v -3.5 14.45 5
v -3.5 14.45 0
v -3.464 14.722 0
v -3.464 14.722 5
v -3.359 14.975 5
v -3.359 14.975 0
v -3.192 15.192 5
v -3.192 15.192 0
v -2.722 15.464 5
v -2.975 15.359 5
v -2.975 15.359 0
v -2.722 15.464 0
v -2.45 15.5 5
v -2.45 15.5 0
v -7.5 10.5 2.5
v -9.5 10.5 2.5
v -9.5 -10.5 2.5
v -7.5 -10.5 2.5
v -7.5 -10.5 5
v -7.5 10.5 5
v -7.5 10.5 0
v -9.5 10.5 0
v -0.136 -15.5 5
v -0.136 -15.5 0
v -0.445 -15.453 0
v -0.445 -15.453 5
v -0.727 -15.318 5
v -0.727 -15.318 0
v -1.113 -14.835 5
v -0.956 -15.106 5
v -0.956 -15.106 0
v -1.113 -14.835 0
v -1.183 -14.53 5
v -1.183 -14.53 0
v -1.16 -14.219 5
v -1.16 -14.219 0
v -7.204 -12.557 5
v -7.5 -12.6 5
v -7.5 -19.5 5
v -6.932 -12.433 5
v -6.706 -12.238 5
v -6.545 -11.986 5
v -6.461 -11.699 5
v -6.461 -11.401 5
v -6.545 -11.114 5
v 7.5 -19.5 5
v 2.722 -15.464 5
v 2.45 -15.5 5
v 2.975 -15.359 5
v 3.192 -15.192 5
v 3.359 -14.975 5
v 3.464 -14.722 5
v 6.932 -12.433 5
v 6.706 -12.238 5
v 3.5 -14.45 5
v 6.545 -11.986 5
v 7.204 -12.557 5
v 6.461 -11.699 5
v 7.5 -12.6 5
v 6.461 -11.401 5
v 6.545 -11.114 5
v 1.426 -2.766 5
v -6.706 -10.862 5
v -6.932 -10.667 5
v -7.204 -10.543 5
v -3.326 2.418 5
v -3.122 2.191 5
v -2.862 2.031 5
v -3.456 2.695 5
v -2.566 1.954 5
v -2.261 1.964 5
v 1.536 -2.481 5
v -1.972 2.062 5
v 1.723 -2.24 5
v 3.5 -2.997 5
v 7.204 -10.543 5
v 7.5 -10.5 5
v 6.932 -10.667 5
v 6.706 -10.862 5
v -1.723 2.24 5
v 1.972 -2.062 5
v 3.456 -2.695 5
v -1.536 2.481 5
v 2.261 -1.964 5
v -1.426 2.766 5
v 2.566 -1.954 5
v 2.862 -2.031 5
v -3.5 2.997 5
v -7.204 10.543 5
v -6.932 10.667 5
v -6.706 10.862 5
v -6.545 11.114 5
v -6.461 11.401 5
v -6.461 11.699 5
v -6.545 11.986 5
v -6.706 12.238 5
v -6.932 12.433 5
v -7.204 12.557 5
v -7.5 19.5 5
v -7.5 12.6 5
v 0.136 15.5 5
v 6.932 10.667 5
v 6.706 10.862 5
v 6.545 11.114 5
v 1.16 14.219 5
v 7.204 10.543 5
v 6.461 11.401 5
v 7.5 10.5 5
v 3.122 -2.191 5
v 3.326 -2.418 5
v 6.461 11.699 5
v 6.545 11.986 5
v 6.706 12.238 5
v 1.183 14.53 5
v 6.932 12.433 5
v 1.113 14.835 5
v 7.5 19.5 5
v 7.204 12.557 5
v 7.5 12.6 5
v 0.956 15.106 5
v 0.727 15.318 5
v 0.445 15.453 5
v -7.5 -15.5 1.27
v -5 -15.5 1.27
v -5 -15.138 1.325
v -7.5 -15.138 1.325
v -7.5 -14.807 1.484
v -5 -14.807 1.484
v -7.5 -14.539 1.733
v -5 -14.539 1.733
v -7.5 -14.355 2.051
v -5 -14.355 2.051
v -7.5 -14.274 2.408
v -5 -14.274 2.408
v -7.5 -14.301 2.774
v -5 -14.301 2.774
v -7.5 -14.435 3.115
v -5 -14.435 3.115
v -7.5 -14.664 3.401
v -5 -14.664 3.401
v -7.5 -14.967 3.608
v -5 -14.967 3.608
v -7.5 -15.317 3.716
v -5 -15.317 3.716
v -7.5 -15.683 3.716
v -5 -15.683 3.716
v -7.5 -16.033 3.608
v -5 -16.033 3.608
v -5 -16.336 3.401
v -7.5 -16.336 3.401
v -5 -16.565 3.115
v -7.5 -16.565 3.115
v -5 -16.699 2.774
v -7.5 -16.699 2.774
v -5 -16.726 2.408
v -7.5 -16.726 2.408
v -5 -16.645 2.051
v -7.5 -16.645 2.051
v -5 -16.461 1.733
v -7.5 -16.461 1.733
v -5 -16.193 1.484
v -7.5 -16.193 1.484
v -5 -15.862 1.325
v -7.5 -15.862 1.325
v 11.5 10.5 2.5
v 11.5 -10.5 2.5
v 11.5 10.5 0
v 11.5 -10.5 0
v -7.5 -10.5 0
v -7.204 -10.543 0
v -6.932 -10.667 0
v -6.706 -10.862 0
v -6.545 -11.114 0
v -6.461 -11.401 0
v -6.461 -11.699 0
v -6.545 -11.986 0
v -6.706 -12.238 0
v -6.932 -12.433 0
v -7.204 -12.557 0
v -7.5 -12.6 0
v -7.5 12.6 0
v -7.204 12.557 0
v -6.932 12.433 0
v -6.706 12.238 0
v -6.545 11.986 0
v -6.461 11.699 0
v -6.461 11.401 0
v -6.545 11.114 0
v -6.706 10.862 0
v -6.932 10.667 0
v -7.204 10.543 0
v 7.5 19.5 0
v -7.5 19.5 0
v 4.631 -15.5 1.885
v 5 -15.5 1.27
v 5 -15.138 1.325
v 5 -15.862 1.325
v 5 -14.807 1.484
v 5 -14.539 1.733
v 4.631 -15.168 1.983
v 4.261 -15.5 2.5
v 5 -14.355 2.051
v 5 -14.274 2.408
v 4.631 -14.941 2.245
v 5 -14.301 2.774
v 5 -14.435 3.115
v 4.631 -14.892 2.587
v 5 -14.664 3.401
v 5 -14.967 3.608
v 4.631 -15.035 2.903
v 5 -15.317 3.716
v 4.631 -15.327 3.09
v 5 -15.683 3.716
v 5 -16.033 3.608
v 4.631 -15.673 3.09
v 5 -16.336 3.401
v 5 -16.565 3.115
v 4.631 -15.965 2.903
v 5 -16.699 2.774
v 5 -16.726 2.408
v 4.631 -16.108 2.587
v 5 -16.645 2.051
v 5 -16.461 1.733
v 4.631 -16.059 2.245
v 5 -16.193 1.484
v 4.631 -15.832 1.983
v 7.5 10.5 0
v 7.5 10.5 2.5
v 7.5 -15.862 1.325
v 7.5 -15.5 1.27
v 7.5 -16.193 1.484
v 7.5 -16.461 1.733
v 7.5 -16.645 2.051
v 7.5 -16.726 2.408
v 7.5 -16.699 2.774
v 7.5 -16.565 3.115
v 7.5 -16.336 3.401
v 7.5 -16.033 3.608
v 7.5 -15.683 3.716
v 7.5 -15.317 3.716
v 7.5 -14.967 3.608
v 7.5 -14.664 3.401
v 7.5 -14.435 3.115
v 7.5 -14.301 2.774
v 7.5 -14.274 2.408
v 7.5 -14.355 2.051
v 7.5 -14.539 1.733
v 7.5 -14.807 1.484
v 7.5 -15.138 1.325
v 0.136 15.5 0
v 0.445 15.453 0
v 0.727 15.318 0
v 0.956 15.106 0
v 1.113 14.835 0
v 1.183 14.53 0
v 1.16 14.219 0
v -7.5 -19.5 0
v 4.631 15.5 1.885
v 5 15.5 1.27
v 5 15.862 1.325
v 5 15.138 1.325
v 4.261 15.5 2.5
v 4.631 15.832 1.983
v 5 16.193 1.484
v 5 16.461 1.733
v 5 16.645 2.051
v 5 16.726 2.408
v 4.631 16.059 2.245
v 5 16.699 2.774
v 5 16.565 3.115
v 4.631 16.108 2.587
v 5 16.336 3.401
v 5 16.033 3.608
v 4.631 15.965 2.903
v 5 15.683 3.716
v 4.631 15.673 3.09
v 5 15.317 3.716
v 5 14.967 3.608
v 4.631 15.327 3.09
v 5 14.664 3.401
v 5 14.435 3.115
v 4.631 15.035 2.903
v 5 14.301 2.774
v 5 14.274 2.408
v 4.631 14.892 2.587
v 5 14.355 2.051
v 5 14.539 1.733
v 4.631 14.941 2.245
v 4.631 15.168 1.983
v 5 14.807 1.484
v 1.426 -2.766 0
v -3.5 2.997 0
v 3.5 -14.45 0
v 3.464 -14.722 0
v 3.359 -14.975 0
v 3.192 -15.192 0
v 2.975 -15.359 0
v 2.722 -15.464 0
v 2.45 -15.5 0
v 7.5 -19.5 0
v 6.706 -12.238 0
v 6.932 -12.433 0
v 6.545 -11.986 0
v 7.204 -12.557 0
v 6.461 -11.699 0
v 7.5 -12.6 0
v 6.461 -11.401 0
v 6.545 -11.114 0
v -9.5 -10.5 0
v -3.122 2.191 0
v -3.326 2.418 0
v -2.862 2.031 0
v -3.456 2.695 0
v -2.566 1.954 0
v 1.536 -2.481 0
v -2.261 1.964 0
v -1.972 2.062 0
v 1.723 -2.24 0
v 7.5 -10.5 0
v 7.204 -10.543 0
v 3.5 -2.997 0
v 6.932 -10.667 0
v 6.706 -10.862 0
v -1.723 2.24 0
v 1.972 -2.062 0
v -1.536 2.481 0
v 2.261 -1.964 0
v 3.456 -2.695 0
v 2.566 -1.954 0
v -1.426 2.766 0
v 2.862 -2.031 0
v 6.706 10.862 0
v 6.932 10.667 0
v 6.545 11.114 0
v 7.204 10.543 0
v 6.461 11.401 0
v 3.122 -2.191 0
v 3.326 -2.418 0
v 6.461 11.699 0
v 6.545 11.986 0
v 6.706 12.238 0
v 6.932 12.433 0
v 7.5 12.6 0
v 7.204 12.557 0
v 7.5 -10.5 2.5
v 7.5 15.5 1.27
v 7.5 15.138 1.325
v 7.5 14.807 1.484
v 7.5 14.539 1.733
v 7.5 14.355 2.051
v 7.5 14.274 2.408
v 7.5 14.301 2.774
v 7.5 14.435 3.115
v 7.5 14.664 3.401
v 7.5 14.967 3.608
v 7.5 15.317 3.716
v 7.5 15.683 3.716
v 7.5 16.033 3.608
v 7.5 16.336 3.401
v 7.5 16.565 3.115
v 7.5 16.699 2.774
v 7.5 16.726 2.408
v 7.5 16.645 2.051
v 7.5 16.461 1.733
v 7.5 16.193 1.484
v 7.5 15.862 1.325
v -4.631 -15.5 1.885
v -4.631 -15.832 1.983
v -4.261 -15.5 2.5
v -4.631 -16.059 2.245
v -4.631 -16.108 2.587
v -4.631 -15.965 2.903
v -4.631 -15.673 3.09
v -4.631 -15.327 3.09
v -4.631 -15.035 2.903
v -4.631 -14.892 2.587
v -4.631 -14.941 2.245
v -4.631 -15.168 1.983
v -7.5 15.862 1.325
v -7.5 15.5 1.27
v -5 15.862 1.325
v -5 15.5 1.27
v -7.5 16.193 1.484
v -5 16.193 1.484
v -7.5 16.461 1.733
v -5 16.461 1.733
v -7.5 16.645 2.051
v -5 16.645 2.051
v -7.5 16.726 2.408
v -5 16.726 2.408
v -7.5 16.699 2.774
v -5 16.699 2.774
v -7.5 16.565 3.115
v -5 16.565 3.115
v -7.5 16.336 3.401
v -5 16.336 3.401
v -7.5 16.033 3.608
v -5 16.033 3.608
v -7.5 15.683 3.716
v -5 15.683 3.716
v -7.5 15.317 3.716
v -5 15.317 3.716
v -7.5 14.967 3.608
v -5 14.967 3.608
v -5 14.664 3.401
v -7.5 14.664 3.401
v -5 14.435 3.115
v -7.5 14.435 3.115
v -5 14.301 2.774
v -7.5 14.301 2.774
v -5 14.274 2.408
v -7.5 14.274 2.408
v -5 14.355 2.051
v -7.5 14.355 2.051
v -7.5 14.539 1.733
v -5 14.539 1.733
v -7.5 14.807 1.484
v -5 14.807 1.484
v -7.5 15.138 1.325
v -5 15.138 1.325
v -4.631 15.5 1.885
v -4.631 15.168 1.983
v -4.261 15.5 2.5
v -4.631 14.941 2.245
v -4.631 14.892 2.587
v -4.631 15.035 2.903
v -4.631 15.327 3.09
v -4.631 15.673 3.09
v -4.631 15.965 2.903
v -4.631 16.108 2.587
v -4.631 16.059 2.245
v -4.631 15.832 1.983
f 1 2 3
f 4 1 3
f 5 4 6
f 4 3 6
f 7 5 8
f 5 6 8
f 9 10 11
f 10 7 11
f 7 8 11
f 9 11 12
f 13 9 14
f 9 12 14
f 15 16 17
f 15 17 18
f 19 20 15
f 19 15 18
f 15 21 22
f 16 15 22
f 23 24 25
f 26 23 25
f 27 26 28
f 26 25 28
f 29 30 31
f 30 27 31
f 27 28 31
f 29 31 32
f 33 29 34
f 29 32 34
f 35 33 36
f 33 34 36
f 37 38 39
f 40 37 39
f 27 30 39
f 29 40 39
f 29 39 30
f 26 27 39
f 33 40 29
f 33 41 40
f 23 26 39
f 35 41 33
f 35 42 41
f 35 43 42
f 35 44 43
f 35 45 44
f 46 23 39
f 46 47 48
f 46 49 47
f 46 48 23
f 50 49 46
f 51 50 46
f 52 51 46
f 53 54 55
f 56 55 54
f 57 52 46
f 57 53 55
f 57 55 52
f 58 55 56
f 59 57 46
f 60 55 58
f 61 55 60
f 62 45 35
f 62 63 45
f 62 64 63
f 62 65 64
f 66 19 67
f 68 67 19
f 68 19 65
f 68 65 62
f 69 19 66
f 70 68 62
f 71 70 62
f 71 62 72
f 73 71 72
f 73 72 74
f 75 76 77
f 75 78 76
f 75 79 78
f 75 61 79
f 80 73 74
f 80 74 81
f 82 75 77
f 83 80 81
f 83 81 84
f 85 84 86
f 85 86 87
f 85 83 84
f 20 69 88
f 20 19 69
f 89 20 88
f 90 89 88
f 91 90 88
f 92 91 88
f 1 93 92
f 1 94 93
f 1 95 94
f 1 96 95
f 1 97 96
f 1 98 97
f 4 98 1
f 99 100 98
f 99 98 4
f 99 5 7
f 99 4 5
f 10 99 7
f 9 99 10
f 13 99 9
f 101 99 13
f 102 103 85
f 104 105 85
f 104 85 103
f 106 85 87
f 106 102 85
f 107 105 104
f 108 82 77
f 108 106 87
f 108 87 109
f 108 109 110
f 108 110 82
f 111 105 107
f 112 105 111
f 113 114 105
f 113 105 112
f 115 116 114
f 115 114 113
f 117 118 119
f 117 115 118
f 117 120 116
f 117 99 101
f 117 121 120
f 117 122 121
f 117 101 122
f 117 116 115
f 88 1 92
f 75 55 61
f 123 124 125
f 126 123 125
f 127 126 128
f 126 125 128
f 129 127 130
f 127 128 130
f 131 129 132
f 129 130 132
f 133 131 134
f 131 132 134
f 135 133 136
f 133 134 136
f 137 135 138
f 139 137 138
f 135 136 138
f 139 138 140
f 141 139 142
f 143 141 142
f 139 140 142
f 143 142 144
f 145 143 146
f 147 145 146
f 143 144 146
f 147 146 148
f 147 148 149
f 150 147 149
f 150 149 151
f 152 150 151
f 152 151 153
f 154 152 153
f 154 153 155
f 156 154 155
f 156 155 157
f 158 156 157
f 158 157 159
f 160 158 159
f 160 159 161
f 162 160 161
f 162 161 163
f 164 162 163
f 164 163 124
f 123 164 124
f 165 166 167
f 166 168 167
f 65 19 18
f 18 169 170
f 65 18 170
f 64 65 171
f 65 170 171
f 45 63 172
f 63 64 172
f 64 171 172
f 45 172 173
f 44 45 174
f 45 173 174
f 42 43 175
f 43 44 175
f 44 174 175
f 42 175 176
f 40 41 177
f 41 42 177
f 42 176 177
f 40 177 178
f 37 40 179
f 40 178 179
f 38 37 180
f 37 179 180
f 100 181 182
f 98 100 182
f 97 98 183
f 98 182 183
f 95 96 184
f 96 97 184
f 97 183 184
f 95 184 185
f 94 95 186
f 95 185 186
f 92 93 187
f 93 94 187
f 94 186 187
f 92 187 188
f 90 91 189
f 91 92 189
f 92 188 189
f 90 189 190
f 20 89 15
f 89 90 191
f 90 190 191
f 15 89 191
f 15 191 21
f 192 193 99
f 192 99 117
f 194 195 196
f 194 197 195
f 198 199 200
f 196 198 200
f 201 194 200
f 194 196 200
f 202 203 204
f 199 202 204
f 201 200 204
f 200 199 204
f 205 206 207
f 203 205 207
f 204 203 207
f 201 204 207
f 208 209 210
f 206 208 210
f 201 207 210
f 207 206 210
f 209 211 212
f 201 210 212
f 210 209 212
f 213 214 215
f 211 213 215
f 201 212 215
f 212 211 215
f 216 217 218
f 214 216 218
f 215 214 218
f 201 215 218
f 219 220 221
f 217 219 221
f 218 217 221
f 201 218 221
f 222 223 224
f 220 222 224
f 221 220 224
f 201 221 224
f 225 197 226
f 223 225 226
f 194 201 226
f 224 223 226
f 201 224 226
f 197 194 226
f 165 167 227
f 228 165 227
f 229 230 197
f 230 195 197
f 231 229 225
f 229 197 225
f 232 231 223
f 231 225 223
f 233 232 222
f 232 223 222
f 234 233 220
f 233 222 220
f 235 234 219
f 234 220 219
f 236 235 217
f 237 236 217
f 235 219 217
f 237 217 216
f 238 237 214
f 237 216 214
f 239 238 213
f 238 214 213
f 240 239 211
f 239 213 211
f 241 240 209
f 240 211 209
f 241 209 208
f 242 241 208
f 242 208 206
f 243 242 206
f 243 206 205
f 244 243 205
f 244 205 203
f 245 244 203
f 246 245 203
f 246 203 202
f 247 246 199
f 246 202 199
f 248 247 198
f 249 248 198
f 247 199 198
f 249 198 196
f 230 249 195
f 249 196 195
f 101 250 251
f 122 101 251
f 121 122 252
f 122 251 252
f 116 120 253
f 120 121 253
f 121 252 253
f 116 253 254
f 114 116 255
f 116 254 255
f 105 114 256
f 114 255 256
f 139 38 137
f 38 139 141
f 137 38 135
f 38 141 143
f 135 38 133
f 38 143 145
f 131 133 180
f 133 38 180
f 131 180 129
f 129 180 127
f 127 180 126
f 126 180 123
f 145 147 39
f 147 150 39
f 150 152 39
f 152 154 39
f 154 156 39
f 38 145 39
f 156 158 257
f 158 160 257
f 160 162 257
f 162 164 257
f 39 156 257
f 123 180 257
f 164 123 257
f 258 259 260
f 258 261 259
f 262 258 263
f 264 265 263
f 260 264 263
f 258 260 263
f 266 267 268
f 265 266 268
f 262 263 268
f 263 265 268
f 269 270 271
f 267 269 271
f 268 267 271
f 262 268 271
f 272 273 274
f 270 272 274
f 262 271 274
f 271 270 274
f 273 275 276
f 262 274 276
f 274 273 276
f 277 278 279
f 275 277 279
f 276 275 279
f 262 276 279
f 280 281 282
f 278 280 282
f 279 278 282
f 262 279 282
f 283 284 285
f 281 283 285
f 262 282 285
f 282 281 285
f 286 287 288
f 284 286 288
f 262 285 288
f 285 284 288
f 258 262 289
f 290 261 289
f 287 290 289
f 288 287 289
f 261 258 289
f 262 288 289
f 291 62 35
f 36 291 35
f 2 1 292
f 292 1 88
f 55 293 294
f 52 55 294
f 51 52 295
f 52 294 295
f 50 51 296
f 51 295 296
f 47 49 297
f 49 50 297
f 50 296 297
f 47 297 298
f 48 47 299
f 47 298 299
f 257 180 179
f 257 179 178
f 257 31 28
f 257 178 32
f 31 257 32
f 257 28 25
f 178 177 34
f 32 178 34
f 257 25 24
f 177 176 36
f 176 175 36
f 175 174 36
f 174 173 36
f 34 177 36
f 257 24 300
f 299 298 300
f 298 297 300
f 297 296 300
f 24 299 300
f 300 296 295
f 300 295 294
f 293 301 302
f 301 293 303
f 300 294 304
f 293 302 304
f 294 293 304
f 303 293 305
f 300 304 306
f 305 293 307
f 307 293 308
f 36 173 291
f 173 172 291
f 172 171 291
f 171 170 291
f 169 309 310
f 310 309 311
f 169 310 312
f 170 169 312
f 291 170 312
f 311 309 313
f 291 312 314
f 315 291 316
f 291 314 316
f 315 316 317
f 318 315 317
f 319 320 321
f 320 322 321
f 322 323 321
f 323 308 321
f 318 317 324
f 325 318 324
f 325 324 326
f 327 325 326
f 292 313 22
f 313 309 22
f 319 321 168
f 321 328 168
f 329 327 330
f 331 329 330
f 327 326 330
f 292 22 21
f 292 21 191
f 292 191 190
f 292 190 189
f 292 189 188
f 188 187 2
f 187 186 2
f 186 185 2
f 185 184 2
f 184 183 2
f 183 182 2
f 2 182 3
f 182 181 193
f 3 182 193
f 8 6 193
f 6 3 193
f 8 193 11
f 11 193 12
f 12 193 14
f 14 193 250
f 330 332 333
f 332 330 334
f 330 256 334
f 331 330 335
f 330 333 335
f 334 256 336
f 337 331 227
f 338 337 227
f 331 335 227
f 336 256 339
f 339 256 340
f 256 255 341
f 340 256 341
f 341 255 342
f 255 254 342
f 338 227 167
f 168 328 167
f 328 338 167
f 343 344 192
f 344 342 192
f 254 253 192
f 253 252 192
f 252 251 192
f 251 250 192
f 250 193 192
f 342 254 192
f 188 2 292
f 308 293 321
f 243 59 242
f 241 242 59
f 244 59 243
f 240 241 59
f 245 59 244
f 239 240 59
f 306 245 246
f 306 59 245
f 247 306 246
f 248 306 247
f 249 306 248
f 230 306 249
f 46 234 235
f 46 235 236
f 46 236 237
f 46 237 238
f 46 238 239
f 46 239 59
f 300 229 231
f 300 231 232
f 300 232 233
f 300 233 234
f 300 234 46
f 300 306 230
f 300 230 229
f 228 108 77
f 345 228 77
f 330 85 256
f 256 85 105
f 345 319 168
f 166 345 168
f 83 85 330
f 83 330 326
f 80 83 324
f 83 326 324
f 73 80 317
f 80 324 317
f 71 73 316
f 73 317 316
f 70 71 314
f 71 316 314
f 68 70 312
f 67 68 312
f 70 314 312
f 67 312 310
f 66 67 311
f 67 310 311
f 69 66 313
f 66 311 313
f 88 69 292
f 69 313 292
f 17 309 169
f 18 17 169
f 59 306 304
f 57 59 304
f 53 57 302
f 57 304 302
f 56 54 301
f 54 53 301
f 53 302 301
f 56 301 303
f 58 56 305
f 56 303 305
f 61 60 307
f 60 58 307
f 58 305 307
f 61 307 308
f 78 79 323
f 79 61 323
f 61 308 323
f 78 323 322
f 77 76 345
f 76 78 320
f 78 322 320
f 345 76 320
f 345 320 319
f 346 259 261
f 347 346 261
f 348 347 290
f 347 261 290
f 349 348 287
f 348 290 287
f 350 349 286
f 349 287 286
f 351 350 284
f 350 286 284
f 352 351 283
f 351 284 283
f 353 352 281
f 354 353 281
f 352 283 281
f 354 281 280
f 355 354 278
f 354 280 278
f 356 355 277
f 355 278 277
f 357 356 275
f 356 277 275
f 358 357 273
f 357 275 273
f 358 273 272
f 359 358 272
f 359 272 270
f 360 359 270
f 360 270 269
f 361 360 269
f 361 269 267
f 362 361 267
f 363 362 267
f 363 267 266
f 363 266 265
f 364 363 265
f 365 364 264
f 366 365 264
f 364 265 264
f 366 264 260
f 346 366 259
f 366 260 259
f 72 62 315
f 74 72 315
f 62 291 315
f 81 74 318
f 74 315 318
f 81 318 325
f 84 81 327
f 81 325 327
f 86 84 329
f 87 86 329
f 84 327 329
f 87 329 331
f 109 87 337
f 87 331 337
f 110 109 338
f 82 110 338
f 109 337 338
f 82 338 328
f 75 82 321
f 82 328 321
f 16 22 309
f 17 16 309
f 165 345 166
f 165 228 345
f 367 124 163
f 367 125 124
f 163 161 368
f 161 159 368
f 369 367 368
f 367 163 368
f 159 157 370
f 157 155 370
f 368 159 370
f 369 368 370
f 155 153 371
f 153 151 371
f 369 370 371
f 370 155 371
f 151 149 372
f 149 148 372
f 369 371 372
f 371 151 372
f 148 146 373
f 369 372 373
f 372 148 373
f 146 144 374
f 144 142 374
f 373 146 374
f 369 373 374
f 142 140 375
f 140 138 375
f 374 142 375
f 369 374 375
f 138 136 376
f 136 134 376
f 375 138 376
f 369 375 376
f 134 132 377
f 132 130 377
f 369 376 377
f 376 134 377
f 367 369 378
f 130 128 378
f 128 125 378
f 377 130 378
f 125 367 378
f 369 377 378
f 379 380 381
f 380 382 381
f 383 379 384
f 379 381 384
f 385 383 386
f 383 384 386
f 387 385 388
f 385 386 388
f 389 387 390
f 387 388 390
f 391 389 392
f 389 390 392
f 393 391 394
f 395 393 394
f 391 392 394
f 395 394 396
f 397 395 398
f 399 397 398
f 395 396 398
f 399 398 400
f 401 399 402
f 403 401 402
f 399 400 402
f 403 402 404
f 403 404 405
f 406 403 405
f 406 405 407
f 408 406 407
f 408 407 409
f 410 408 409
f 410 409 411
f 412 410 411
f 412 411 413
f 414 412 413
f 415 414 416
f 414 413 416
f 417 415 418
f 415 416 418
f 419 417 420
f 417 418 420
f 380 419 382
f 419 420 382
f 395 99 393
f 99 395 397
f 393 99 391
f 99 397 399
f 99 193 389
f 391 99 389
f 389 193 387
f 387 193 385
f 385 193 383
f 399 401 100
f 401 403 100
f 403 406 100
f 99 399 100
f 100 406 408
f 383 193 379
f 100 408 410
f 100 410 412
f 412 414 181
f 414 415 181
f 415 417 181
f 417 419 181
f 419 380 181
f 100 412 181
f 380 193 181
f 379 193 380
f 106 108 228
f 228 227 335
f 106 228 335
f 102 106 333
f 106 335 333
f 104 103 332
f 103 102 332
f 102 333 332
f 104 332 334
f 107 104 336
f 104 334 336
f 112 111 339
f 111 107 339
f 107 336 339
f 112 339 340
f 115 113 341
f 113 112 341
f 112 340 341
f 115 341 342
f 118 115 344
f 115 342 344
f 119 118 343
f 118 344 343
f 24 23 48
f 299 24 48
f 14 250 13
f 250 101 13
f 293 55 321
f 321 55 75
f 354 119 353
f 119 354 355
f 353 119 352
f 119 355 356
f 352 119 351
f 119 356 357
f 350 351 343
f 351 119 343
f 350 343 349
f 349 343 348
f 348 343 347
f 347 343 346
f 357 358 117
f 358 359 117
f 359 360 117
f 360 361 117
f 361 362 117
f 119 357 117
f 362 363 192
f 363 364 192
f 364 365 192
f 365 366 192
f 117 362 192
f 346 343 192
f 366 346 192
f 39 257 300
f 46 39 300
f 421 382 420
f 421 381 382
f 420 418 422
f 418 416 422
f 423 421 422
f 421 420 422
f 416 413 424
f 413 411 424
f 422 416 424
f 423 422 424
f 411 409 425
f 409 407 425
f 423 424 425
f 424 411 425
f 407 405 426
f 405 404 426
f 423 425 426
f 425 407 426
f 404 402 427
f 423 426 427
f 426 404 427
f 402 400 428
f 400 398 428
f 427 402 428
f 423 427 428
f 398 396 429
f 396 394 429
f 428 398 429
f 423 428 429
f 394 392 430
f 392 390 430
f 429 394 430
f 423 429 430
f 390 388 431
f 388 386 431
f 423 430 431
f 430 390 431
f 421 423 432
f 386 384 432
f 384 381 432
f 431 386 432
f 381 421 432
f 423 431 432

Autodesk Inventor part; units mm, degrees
ref_plane "YZ Plane" through (0, 0, 0) normal (1, 0, 0) x (0, 1, 0)
ref_plane "XZ Plane" through (0, 0, 0) normal (0, 1, 0) x (-1, 0, 0)
ref_plane "XY Plane" through (0, 0, 0) normal (0, 0, 1) x (1, 0, 0)
sketch "スケッチ1" plane through (0, 0, 0) normal (0, 0, 1) x (1, 0, 0)
  line L0 (-7.5, -19.5) -> (7.5, -19.5) construction
  line L1 (7.5, -19.5) -> (7.5, 19.5) construction
  line L2 (7.5, 19.5) -> (-7.5, 19.5) construction
  line L3 (-7.5, 19.5) -> (-7.5, -19.5) construction
  line L4 (-7.5, -19.5) -> (7.5, 19.5) construction
  line L5 (7.5, -19.5) -> (-7.5, 19.5) construction
  line L6 (-7.5, 10.5) -> (-7.5, 19.5) construction
  line L7 (-7.5, 19.5) -> (7.5, 19.5)
  line L8 (7.5, 19.5) -> (7.5, 10.5) construction
  line L9 (-7.5, 10.5) -> (-9.5, 10.5)
  line L10 (-9.5, 10.5) -> (-9.5, -10.5)
  line L11 (-9.5, -10.5) -> (-7.5, -10.5)
  line L12 (-7.5, -10.5) -> (-7.5, -19.5) construction
  line L13 (-7.5, -19.5) -> (7.5, -19.5)
  line L14 (7.5, -19.5) -> (7.5, -10.5) construction
  line L15 (7.5, -10.5) -> (11.5, -10.5)
  line L16 (11.5, -10.5) -> (11.5, 10.5)
  line L17 (11.5, 10.5) -> (7.5, 10.5)
  line L18 (0, 0) -> (11.5, 0) construction
  circle A0 centre (-7.5, 11.55) radius 1.05 construction
  circle A1 centre (-7.5, -11.55) radius 1.05 construction
  circle A2 centre (7.5, 11.55) radius 1.05 construction
  circle A3 centre (7.5, -11.55) radius 1.05 construction
  line L19 (-7.5, 19.5) -> (-7.5, 12.6)
  arc A4 (-7.5, 10.5) -> (-7.5, 12.6) centre (-7.5, 11.55) ccw
  arc A5 (-7.5, -12.6) -> (-7.5, -10.5) centre (-7.5, -11.55) ccw
  line L20 (-7.5, -12.6) -> (-7.5, -19.5)
  line L21 (7.5, 12.6) -> (7.5, 19.5)
  arc A6 (7.5, 12.6) -> (7.5, 10.5) centre (7.5, 11.55) ccw
  line L22 (7.5, -12.6) -> (7.5, -19.5)
  arc A7 (7.5, -10.5) -> (7.5, -12.6) centre (7.5, -11.55) ccw
  dimension "d21" = 2
  dimension "d23" = 4
  dimension "d30" = 15
  dimension "d48" = 9
  dimension "d49" = 39
  dimension "d50" = 2.1
extrude "押し出し1" add sketch "スケッチ1" along normal blind 5
sketch "スケッチ2" plane through (7.5, -19.5, 0) normal (1, 0, 0) x (0, 0, -1)
  line L0 (0, 0) -> (-5, 0) projected
  line L1 (0, 39) -> (-5, 39) projected
  point P0 (0, 19.5)
  point P1 (-2.5, 4)
  point P2 (-2.5, 35)
  point P3 (-2.5, 0)
  dimension "d53" = 4
  dimension "d54" = 4
hole "穴1" at (7.5, -15.5, 2.5) at (7.5, 15.5, 2.5) direction (-1, 0, 0) diameter 2.459 depth 2.5 tip angle 118 thread size "M3x0.5" class "6H" standard "ISO Metric profile"
mirror "ミラー1" about plane through (0, 0, 0) normal (1, 0, 0) of "穴1"
sketch "スケッチ3" plane through (0, 0, 5) normal (0, 0, 1) x (1, 0, 0)
  line L0 (7.5, 12.6) -> (7.5, 19.5) projected
  line L1 (-7.5, 19.5) -> (-7.5, 12.6) projected
  line L2 (-12.0807, 15.6684) -> (-7.5, 15.6684)
  line L3 (-7.5, 15.6684) -> (-7.5, -16.7148)
  line L4 (-7.5, -16.7148) -> (-12.0807, -16.7148)
  line L5 (-12.0807, -16.7148) -> (-12.0807, 15.6684)
  line L6 (12.9714, 11.55) -> (7.5, 11.55)
  line L7 (7.5, 11.55) -> (7.5, -15.9078)
  line L8 (7.5, -15.9078) -> (12.9714, -15.9078)
  line L9 (12.9714, -15.9078) -> (12.9714, 11.55)
  point P0 (0, 0)
extrude "押し出し2" cut sketch "スケッチ3" against normal blind 2.5
sketch "スケッチ4" plane through (0, 0, 5) normal (0, 0, 1) x (1, 0, 0)
  line L0 (7.5, 12.6) -> (7.5, 19.5) projected
  line L1 (7.5, 19.5) -> (-7.5, 19.5) projected
  line L2 (-7.5, -12.6) -> (-7.5, -19.5) projected
  line L3 (-7.5, -19.5) -> (7.5, -19.5) projected
  line L4 (-3.5, 15.5) -> (3.5, 15.5) construction
  line L5 (3.5, 15.5) -> (3.5, -15.5) construction
  line L6 (3.5, -15.5) -> (-3.5, -15.5) construction
  line L7 (-3.5, -15.5) -> (-3.5, 15.5) construction
  line L8 (3.5, 15.5) -> (-3.5, -15.5) construction
  line L9 (1.4496, 15.5) -> (-3.5, 15.5)
  line L10 (-3.5, 15.5) -> (-3.5, -6.4199)
  line L11 (-3.5, -6.4199) -> (1.4496, 15.5)
  line L12 (-1.4496, -15.5) -> (3.5, -15.5)
  line L13 (3.5, -15.5) -> (3.5, 6.4199)
  line L14 (3.5, 6.4199) -> (-1.4496, -15.5)
  point P0 (0, 0)
  dimension "d64" = 4
  dimension "d65" = 4
  dimension "d66" = 4
  dimension "d67" = 4
  dimension "d68" = 4
extrude "押し出し3" cut sketch "スケッチ4" against normal blind 5
fillet "フィレット1" radius 1.05 6 edges at (-1.4496, -15.5, 2.5) (-3.5, 15.5, 2.5) (1.4496, 15.5, 2.5) (3.5, 6.4199, 2.5) (-3.5, -6.4199, 2.5) (3.5, -15.5, 2.5)
equation "\"d48\" = d26 + d35"
equation "\"d49\" = d38"
equation "\"d53\" = d35"
equation "\"d54\" = d53"
equation "\"d66\" = d65"
equation "\"d68\" = d67"
equation "\"d26\" = 5"
equation "\"d35\" = 4"
equation "\"d38\" = 39"
properties part number "Trunk_armpit_frame" material "アセタール樹脂、黒"
